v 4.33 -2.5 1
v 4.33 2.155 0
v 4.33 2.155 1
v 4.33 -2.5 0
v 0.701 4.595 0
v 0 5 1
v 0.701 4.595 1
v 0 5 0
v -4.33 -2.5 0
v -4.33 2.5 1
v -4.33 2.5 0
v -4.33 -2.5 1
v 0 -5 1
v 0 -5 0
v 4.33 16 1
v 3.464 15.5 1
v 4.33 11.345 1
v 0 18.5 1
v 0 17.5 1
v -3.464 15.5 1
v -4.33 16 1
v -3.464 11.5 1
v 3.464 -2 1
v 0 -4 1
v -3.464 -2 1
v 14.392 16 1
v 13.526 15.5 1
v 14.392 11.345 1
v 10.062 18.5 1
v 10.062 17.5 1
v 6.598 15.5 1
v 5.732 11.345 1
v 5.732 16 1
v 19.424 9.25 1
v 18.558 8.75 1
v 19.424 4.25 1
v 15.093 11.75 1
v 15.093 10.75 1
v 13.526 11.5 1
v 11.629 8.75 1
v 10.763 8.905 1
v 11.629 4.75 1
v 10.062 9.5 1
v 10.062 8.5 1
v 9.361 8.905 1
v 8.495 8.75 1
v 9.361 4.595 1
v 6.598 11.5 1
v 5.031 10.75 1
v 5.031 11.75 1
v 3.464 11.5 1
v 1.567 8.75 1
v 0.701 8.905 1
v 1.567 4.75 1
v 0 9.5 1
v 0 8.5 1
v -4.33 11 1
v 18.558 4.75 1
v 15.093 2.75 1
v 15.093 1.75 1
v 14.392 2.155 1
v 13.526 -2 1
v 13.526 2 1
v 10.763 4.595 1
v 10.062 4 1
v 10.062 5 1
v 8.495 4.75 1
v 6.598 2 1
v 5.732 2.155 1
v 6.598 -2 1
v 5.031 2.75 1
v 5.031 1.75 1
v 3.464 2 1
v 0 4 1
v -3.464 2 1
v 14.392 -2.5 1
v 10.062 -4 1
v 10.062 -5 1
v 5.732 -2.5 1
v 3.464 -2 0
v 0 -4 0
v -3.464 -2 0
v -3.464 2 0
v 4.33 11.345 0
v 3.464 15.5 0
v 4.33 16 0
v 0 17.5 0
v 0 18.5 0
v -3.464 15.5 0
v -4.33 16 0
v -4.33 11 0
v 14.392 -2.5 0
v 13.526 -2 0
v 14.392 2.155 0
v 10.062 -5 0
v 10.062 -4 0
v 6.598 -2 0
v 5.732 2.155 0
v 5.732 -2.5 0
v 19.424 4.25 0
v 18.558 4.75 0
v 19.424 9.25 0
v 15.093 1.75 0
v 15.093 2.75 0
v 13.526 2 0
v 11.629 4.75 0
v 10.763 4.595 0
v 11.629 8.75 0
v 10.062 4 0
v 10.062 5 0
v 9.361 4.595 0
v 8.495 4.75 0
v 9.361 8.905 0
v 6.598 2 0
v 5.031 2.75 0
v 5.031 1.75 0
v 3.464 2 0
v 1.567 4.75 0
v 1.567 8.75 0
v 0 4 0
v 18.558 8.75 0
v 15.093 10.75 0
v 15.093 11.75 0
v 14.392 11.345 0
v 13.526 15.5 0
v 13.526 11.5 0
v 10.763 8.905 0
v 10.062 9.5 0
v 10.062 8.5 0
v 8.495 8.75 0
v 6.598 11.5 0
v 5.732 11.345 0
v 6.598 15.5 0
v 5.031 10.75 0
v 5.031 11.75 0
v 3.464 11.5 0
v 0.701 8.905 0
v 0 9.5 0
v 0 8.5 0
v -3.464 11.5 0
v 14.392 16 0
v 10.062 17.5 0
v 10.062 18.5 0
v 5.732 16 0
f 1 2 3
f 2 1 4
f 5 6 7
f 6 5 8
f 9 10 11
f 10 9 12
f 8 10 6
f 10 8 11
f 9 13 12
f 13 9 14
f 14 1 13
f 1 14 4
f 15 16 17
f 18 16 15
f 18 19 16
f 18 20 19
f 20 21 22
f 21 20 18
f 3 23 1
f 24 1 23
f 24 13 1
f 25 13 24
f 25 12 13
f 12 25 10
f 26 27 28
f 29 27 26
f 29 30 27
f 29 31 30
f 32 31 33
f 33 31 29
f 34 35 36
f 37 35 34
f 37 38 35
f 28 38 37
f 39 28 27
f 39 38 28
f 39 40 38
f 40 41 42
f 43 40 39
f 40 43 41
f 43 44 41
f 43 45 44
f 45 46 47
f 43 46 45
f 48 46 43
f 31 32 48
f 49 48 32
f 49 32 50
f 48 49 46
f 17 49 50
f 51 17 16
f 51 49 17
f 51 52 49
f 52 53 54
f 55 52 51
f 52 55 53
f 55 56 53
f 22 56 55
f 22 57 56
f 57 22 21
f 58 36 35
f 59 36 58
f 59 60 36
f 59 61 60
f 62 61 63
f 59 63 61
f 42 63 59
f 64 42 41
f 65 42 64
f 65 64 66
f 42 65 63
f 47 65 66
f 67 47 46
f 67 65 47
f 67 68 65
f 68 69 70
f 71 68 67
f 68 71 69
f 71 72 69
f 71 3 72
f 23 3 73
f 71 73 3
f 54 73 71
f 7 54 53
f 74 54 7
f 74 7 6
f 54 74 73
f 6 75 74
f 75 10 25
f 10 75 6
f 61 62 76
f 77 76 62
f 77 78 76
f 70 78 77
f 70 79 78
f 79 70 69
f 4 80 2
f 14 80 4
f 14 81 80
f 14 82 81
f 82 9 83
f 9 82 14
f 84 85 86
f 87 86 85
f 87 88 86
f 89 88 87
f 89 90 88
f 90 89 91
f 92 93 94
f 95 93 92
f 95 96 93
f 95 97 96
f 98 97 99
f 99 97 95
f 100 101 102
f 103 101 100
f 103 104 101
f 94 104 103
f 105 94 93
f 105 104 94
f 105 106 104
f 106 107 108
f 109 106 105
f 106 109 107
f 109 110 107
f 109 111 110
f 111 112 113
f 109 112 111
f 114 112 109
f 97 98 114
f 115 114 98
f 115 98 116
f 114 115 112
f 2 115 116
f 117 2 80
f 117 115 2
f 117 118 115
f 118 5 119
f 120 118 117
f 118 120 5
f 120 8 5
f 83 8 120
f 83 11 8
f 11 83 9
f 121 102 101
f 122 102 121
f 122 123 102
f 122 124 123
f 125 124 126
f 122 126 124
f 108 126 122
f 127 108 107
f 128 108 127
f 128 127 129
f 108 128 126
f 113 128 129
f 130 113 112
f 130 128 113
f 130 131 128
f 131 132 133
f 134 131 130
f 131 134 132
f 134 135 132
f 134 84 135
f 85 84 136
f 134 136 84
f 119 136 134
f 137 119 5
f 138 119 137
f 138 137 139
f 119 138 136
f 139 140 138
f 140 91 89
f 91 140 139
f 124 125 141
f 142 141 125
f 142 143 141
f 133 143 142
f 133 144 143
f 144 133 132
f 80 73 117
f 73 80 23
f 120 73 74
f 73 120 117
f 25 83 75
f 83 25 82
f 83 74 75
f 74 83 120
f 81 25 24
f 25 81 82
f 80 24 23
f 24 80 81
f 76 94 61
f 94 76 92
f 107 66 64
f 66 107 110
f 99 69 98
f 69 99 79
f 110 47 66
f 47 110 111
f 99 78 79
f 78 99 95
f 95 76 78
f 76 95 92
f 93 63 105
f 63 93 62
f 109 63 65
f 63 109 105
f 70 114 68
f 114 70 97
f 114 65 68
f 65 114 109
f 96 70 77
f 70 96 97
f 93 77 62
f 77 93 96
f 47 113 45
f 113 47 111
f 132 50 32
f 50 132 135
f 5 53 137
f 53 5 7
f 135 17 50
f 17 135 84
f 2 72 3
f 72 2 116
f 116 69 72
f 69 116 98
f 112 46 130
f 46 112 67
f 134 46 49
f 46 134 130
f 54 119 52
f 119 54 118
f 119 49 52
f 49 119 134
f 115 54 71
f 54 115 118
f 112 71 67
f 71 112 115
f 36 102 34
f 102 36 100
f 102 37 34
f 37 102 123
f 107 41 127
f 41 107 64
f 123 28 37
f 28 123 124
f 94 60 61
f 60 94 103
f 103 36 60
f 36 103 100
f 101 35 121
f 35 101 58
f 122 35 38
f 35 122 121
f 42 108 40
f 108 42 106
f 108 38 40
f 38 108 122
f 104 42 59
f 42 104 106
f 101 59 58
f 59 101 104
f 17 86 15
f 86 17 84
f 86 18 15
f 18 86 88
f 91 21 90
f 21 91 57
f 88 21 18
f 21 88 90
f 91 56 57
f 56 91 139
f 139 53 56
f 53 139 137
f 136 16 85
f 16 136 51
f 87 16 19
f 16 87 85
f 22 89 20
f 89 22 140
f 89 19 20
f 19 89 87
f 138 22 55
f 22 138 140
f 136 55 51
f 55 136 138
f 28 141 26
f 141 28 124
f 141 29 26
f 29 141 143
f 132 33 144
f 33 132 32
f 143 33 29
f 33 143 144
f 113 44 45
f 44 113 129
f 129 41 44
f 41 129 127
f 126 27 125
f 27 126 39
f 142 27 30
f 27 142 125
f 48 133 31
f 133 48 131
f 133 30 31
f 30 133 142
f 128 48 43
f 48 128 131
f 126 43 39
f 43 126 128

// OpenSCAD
// file: math.scad
///< Math scad module


///< Find the hypotenuse from two sides of a right triangle
function hyp_from_sides( a, b ) = sqrt( pow( a, 2 ) + pow( b, 2 ) );

///< Find equal sides from hypotenuse of a right triangle
function sides_from_hyp(h) = sqrt( pow( h, 2 ) / 2 );


///< Test for math functions

A = 3;
B = 4;
echo("Given A=", A, "and B=", B );
H = hyp_from_sides( A, B );
echo("Hypotenuse=", H );
echo("Calc Correct = ", (H == 5) );

echo("Given H=", H, " which is a hypotenuse with equal sides" );
sides = sides_from_hyp( H );
echo( "the sides=", sides );
// main file
///< Honeycomb Generator
use <math.scad>;

///< Cell parameters mm
cell_thickness = 1;
cell_height    = 1;
cell_radius    = 5;

///< Comb parameters mm


///< Modules
module cell( height, radius, thickness=1, open=true ){
       h_adjust = open ? 1 : 0;
       r_adjust = ( radius == thickness ) ? ( radius - ( radius -1 ) ) : thickness;
       difference(){
	cylinder( h=height, r=radius, $fn=6 );
	color("blue",0.75)cylinder( h=height, r=radius-r_adjust, $fn=6 );
	}
}

module tile( rows=1, cols=1, obj_r = 1, pack=true ) {
       ///< Simple HCP latice
       ///< ( https://en.wikipedia.org/wiki/Close-packing_of_equal_spheres#Simple_hcp_lattice )
       cellsize = pack ? obj_r - obj_r * 0.1 : obj_r ;
       
       offset = hyp_from_sides( (cellsize * 2), cellsize );
       for( i = [0:rows-1] ){
       	    for( j = [0:cols-1] ){
	    	 translate( [ ( j * offset ) + ( i % 2 ) * (offset/2 ), i * ( cellsize * 1.5 ), 0 ] )
		 rotate( [0, 0, 90 ] ) ///< Rotate the cells so they are aligned
		 children();
		 }
	}
}



///< Proto type
tile( 3, 2, cell_radius, true) cell( cell_height, cell_radius, cell_thickness );
///< Tile
